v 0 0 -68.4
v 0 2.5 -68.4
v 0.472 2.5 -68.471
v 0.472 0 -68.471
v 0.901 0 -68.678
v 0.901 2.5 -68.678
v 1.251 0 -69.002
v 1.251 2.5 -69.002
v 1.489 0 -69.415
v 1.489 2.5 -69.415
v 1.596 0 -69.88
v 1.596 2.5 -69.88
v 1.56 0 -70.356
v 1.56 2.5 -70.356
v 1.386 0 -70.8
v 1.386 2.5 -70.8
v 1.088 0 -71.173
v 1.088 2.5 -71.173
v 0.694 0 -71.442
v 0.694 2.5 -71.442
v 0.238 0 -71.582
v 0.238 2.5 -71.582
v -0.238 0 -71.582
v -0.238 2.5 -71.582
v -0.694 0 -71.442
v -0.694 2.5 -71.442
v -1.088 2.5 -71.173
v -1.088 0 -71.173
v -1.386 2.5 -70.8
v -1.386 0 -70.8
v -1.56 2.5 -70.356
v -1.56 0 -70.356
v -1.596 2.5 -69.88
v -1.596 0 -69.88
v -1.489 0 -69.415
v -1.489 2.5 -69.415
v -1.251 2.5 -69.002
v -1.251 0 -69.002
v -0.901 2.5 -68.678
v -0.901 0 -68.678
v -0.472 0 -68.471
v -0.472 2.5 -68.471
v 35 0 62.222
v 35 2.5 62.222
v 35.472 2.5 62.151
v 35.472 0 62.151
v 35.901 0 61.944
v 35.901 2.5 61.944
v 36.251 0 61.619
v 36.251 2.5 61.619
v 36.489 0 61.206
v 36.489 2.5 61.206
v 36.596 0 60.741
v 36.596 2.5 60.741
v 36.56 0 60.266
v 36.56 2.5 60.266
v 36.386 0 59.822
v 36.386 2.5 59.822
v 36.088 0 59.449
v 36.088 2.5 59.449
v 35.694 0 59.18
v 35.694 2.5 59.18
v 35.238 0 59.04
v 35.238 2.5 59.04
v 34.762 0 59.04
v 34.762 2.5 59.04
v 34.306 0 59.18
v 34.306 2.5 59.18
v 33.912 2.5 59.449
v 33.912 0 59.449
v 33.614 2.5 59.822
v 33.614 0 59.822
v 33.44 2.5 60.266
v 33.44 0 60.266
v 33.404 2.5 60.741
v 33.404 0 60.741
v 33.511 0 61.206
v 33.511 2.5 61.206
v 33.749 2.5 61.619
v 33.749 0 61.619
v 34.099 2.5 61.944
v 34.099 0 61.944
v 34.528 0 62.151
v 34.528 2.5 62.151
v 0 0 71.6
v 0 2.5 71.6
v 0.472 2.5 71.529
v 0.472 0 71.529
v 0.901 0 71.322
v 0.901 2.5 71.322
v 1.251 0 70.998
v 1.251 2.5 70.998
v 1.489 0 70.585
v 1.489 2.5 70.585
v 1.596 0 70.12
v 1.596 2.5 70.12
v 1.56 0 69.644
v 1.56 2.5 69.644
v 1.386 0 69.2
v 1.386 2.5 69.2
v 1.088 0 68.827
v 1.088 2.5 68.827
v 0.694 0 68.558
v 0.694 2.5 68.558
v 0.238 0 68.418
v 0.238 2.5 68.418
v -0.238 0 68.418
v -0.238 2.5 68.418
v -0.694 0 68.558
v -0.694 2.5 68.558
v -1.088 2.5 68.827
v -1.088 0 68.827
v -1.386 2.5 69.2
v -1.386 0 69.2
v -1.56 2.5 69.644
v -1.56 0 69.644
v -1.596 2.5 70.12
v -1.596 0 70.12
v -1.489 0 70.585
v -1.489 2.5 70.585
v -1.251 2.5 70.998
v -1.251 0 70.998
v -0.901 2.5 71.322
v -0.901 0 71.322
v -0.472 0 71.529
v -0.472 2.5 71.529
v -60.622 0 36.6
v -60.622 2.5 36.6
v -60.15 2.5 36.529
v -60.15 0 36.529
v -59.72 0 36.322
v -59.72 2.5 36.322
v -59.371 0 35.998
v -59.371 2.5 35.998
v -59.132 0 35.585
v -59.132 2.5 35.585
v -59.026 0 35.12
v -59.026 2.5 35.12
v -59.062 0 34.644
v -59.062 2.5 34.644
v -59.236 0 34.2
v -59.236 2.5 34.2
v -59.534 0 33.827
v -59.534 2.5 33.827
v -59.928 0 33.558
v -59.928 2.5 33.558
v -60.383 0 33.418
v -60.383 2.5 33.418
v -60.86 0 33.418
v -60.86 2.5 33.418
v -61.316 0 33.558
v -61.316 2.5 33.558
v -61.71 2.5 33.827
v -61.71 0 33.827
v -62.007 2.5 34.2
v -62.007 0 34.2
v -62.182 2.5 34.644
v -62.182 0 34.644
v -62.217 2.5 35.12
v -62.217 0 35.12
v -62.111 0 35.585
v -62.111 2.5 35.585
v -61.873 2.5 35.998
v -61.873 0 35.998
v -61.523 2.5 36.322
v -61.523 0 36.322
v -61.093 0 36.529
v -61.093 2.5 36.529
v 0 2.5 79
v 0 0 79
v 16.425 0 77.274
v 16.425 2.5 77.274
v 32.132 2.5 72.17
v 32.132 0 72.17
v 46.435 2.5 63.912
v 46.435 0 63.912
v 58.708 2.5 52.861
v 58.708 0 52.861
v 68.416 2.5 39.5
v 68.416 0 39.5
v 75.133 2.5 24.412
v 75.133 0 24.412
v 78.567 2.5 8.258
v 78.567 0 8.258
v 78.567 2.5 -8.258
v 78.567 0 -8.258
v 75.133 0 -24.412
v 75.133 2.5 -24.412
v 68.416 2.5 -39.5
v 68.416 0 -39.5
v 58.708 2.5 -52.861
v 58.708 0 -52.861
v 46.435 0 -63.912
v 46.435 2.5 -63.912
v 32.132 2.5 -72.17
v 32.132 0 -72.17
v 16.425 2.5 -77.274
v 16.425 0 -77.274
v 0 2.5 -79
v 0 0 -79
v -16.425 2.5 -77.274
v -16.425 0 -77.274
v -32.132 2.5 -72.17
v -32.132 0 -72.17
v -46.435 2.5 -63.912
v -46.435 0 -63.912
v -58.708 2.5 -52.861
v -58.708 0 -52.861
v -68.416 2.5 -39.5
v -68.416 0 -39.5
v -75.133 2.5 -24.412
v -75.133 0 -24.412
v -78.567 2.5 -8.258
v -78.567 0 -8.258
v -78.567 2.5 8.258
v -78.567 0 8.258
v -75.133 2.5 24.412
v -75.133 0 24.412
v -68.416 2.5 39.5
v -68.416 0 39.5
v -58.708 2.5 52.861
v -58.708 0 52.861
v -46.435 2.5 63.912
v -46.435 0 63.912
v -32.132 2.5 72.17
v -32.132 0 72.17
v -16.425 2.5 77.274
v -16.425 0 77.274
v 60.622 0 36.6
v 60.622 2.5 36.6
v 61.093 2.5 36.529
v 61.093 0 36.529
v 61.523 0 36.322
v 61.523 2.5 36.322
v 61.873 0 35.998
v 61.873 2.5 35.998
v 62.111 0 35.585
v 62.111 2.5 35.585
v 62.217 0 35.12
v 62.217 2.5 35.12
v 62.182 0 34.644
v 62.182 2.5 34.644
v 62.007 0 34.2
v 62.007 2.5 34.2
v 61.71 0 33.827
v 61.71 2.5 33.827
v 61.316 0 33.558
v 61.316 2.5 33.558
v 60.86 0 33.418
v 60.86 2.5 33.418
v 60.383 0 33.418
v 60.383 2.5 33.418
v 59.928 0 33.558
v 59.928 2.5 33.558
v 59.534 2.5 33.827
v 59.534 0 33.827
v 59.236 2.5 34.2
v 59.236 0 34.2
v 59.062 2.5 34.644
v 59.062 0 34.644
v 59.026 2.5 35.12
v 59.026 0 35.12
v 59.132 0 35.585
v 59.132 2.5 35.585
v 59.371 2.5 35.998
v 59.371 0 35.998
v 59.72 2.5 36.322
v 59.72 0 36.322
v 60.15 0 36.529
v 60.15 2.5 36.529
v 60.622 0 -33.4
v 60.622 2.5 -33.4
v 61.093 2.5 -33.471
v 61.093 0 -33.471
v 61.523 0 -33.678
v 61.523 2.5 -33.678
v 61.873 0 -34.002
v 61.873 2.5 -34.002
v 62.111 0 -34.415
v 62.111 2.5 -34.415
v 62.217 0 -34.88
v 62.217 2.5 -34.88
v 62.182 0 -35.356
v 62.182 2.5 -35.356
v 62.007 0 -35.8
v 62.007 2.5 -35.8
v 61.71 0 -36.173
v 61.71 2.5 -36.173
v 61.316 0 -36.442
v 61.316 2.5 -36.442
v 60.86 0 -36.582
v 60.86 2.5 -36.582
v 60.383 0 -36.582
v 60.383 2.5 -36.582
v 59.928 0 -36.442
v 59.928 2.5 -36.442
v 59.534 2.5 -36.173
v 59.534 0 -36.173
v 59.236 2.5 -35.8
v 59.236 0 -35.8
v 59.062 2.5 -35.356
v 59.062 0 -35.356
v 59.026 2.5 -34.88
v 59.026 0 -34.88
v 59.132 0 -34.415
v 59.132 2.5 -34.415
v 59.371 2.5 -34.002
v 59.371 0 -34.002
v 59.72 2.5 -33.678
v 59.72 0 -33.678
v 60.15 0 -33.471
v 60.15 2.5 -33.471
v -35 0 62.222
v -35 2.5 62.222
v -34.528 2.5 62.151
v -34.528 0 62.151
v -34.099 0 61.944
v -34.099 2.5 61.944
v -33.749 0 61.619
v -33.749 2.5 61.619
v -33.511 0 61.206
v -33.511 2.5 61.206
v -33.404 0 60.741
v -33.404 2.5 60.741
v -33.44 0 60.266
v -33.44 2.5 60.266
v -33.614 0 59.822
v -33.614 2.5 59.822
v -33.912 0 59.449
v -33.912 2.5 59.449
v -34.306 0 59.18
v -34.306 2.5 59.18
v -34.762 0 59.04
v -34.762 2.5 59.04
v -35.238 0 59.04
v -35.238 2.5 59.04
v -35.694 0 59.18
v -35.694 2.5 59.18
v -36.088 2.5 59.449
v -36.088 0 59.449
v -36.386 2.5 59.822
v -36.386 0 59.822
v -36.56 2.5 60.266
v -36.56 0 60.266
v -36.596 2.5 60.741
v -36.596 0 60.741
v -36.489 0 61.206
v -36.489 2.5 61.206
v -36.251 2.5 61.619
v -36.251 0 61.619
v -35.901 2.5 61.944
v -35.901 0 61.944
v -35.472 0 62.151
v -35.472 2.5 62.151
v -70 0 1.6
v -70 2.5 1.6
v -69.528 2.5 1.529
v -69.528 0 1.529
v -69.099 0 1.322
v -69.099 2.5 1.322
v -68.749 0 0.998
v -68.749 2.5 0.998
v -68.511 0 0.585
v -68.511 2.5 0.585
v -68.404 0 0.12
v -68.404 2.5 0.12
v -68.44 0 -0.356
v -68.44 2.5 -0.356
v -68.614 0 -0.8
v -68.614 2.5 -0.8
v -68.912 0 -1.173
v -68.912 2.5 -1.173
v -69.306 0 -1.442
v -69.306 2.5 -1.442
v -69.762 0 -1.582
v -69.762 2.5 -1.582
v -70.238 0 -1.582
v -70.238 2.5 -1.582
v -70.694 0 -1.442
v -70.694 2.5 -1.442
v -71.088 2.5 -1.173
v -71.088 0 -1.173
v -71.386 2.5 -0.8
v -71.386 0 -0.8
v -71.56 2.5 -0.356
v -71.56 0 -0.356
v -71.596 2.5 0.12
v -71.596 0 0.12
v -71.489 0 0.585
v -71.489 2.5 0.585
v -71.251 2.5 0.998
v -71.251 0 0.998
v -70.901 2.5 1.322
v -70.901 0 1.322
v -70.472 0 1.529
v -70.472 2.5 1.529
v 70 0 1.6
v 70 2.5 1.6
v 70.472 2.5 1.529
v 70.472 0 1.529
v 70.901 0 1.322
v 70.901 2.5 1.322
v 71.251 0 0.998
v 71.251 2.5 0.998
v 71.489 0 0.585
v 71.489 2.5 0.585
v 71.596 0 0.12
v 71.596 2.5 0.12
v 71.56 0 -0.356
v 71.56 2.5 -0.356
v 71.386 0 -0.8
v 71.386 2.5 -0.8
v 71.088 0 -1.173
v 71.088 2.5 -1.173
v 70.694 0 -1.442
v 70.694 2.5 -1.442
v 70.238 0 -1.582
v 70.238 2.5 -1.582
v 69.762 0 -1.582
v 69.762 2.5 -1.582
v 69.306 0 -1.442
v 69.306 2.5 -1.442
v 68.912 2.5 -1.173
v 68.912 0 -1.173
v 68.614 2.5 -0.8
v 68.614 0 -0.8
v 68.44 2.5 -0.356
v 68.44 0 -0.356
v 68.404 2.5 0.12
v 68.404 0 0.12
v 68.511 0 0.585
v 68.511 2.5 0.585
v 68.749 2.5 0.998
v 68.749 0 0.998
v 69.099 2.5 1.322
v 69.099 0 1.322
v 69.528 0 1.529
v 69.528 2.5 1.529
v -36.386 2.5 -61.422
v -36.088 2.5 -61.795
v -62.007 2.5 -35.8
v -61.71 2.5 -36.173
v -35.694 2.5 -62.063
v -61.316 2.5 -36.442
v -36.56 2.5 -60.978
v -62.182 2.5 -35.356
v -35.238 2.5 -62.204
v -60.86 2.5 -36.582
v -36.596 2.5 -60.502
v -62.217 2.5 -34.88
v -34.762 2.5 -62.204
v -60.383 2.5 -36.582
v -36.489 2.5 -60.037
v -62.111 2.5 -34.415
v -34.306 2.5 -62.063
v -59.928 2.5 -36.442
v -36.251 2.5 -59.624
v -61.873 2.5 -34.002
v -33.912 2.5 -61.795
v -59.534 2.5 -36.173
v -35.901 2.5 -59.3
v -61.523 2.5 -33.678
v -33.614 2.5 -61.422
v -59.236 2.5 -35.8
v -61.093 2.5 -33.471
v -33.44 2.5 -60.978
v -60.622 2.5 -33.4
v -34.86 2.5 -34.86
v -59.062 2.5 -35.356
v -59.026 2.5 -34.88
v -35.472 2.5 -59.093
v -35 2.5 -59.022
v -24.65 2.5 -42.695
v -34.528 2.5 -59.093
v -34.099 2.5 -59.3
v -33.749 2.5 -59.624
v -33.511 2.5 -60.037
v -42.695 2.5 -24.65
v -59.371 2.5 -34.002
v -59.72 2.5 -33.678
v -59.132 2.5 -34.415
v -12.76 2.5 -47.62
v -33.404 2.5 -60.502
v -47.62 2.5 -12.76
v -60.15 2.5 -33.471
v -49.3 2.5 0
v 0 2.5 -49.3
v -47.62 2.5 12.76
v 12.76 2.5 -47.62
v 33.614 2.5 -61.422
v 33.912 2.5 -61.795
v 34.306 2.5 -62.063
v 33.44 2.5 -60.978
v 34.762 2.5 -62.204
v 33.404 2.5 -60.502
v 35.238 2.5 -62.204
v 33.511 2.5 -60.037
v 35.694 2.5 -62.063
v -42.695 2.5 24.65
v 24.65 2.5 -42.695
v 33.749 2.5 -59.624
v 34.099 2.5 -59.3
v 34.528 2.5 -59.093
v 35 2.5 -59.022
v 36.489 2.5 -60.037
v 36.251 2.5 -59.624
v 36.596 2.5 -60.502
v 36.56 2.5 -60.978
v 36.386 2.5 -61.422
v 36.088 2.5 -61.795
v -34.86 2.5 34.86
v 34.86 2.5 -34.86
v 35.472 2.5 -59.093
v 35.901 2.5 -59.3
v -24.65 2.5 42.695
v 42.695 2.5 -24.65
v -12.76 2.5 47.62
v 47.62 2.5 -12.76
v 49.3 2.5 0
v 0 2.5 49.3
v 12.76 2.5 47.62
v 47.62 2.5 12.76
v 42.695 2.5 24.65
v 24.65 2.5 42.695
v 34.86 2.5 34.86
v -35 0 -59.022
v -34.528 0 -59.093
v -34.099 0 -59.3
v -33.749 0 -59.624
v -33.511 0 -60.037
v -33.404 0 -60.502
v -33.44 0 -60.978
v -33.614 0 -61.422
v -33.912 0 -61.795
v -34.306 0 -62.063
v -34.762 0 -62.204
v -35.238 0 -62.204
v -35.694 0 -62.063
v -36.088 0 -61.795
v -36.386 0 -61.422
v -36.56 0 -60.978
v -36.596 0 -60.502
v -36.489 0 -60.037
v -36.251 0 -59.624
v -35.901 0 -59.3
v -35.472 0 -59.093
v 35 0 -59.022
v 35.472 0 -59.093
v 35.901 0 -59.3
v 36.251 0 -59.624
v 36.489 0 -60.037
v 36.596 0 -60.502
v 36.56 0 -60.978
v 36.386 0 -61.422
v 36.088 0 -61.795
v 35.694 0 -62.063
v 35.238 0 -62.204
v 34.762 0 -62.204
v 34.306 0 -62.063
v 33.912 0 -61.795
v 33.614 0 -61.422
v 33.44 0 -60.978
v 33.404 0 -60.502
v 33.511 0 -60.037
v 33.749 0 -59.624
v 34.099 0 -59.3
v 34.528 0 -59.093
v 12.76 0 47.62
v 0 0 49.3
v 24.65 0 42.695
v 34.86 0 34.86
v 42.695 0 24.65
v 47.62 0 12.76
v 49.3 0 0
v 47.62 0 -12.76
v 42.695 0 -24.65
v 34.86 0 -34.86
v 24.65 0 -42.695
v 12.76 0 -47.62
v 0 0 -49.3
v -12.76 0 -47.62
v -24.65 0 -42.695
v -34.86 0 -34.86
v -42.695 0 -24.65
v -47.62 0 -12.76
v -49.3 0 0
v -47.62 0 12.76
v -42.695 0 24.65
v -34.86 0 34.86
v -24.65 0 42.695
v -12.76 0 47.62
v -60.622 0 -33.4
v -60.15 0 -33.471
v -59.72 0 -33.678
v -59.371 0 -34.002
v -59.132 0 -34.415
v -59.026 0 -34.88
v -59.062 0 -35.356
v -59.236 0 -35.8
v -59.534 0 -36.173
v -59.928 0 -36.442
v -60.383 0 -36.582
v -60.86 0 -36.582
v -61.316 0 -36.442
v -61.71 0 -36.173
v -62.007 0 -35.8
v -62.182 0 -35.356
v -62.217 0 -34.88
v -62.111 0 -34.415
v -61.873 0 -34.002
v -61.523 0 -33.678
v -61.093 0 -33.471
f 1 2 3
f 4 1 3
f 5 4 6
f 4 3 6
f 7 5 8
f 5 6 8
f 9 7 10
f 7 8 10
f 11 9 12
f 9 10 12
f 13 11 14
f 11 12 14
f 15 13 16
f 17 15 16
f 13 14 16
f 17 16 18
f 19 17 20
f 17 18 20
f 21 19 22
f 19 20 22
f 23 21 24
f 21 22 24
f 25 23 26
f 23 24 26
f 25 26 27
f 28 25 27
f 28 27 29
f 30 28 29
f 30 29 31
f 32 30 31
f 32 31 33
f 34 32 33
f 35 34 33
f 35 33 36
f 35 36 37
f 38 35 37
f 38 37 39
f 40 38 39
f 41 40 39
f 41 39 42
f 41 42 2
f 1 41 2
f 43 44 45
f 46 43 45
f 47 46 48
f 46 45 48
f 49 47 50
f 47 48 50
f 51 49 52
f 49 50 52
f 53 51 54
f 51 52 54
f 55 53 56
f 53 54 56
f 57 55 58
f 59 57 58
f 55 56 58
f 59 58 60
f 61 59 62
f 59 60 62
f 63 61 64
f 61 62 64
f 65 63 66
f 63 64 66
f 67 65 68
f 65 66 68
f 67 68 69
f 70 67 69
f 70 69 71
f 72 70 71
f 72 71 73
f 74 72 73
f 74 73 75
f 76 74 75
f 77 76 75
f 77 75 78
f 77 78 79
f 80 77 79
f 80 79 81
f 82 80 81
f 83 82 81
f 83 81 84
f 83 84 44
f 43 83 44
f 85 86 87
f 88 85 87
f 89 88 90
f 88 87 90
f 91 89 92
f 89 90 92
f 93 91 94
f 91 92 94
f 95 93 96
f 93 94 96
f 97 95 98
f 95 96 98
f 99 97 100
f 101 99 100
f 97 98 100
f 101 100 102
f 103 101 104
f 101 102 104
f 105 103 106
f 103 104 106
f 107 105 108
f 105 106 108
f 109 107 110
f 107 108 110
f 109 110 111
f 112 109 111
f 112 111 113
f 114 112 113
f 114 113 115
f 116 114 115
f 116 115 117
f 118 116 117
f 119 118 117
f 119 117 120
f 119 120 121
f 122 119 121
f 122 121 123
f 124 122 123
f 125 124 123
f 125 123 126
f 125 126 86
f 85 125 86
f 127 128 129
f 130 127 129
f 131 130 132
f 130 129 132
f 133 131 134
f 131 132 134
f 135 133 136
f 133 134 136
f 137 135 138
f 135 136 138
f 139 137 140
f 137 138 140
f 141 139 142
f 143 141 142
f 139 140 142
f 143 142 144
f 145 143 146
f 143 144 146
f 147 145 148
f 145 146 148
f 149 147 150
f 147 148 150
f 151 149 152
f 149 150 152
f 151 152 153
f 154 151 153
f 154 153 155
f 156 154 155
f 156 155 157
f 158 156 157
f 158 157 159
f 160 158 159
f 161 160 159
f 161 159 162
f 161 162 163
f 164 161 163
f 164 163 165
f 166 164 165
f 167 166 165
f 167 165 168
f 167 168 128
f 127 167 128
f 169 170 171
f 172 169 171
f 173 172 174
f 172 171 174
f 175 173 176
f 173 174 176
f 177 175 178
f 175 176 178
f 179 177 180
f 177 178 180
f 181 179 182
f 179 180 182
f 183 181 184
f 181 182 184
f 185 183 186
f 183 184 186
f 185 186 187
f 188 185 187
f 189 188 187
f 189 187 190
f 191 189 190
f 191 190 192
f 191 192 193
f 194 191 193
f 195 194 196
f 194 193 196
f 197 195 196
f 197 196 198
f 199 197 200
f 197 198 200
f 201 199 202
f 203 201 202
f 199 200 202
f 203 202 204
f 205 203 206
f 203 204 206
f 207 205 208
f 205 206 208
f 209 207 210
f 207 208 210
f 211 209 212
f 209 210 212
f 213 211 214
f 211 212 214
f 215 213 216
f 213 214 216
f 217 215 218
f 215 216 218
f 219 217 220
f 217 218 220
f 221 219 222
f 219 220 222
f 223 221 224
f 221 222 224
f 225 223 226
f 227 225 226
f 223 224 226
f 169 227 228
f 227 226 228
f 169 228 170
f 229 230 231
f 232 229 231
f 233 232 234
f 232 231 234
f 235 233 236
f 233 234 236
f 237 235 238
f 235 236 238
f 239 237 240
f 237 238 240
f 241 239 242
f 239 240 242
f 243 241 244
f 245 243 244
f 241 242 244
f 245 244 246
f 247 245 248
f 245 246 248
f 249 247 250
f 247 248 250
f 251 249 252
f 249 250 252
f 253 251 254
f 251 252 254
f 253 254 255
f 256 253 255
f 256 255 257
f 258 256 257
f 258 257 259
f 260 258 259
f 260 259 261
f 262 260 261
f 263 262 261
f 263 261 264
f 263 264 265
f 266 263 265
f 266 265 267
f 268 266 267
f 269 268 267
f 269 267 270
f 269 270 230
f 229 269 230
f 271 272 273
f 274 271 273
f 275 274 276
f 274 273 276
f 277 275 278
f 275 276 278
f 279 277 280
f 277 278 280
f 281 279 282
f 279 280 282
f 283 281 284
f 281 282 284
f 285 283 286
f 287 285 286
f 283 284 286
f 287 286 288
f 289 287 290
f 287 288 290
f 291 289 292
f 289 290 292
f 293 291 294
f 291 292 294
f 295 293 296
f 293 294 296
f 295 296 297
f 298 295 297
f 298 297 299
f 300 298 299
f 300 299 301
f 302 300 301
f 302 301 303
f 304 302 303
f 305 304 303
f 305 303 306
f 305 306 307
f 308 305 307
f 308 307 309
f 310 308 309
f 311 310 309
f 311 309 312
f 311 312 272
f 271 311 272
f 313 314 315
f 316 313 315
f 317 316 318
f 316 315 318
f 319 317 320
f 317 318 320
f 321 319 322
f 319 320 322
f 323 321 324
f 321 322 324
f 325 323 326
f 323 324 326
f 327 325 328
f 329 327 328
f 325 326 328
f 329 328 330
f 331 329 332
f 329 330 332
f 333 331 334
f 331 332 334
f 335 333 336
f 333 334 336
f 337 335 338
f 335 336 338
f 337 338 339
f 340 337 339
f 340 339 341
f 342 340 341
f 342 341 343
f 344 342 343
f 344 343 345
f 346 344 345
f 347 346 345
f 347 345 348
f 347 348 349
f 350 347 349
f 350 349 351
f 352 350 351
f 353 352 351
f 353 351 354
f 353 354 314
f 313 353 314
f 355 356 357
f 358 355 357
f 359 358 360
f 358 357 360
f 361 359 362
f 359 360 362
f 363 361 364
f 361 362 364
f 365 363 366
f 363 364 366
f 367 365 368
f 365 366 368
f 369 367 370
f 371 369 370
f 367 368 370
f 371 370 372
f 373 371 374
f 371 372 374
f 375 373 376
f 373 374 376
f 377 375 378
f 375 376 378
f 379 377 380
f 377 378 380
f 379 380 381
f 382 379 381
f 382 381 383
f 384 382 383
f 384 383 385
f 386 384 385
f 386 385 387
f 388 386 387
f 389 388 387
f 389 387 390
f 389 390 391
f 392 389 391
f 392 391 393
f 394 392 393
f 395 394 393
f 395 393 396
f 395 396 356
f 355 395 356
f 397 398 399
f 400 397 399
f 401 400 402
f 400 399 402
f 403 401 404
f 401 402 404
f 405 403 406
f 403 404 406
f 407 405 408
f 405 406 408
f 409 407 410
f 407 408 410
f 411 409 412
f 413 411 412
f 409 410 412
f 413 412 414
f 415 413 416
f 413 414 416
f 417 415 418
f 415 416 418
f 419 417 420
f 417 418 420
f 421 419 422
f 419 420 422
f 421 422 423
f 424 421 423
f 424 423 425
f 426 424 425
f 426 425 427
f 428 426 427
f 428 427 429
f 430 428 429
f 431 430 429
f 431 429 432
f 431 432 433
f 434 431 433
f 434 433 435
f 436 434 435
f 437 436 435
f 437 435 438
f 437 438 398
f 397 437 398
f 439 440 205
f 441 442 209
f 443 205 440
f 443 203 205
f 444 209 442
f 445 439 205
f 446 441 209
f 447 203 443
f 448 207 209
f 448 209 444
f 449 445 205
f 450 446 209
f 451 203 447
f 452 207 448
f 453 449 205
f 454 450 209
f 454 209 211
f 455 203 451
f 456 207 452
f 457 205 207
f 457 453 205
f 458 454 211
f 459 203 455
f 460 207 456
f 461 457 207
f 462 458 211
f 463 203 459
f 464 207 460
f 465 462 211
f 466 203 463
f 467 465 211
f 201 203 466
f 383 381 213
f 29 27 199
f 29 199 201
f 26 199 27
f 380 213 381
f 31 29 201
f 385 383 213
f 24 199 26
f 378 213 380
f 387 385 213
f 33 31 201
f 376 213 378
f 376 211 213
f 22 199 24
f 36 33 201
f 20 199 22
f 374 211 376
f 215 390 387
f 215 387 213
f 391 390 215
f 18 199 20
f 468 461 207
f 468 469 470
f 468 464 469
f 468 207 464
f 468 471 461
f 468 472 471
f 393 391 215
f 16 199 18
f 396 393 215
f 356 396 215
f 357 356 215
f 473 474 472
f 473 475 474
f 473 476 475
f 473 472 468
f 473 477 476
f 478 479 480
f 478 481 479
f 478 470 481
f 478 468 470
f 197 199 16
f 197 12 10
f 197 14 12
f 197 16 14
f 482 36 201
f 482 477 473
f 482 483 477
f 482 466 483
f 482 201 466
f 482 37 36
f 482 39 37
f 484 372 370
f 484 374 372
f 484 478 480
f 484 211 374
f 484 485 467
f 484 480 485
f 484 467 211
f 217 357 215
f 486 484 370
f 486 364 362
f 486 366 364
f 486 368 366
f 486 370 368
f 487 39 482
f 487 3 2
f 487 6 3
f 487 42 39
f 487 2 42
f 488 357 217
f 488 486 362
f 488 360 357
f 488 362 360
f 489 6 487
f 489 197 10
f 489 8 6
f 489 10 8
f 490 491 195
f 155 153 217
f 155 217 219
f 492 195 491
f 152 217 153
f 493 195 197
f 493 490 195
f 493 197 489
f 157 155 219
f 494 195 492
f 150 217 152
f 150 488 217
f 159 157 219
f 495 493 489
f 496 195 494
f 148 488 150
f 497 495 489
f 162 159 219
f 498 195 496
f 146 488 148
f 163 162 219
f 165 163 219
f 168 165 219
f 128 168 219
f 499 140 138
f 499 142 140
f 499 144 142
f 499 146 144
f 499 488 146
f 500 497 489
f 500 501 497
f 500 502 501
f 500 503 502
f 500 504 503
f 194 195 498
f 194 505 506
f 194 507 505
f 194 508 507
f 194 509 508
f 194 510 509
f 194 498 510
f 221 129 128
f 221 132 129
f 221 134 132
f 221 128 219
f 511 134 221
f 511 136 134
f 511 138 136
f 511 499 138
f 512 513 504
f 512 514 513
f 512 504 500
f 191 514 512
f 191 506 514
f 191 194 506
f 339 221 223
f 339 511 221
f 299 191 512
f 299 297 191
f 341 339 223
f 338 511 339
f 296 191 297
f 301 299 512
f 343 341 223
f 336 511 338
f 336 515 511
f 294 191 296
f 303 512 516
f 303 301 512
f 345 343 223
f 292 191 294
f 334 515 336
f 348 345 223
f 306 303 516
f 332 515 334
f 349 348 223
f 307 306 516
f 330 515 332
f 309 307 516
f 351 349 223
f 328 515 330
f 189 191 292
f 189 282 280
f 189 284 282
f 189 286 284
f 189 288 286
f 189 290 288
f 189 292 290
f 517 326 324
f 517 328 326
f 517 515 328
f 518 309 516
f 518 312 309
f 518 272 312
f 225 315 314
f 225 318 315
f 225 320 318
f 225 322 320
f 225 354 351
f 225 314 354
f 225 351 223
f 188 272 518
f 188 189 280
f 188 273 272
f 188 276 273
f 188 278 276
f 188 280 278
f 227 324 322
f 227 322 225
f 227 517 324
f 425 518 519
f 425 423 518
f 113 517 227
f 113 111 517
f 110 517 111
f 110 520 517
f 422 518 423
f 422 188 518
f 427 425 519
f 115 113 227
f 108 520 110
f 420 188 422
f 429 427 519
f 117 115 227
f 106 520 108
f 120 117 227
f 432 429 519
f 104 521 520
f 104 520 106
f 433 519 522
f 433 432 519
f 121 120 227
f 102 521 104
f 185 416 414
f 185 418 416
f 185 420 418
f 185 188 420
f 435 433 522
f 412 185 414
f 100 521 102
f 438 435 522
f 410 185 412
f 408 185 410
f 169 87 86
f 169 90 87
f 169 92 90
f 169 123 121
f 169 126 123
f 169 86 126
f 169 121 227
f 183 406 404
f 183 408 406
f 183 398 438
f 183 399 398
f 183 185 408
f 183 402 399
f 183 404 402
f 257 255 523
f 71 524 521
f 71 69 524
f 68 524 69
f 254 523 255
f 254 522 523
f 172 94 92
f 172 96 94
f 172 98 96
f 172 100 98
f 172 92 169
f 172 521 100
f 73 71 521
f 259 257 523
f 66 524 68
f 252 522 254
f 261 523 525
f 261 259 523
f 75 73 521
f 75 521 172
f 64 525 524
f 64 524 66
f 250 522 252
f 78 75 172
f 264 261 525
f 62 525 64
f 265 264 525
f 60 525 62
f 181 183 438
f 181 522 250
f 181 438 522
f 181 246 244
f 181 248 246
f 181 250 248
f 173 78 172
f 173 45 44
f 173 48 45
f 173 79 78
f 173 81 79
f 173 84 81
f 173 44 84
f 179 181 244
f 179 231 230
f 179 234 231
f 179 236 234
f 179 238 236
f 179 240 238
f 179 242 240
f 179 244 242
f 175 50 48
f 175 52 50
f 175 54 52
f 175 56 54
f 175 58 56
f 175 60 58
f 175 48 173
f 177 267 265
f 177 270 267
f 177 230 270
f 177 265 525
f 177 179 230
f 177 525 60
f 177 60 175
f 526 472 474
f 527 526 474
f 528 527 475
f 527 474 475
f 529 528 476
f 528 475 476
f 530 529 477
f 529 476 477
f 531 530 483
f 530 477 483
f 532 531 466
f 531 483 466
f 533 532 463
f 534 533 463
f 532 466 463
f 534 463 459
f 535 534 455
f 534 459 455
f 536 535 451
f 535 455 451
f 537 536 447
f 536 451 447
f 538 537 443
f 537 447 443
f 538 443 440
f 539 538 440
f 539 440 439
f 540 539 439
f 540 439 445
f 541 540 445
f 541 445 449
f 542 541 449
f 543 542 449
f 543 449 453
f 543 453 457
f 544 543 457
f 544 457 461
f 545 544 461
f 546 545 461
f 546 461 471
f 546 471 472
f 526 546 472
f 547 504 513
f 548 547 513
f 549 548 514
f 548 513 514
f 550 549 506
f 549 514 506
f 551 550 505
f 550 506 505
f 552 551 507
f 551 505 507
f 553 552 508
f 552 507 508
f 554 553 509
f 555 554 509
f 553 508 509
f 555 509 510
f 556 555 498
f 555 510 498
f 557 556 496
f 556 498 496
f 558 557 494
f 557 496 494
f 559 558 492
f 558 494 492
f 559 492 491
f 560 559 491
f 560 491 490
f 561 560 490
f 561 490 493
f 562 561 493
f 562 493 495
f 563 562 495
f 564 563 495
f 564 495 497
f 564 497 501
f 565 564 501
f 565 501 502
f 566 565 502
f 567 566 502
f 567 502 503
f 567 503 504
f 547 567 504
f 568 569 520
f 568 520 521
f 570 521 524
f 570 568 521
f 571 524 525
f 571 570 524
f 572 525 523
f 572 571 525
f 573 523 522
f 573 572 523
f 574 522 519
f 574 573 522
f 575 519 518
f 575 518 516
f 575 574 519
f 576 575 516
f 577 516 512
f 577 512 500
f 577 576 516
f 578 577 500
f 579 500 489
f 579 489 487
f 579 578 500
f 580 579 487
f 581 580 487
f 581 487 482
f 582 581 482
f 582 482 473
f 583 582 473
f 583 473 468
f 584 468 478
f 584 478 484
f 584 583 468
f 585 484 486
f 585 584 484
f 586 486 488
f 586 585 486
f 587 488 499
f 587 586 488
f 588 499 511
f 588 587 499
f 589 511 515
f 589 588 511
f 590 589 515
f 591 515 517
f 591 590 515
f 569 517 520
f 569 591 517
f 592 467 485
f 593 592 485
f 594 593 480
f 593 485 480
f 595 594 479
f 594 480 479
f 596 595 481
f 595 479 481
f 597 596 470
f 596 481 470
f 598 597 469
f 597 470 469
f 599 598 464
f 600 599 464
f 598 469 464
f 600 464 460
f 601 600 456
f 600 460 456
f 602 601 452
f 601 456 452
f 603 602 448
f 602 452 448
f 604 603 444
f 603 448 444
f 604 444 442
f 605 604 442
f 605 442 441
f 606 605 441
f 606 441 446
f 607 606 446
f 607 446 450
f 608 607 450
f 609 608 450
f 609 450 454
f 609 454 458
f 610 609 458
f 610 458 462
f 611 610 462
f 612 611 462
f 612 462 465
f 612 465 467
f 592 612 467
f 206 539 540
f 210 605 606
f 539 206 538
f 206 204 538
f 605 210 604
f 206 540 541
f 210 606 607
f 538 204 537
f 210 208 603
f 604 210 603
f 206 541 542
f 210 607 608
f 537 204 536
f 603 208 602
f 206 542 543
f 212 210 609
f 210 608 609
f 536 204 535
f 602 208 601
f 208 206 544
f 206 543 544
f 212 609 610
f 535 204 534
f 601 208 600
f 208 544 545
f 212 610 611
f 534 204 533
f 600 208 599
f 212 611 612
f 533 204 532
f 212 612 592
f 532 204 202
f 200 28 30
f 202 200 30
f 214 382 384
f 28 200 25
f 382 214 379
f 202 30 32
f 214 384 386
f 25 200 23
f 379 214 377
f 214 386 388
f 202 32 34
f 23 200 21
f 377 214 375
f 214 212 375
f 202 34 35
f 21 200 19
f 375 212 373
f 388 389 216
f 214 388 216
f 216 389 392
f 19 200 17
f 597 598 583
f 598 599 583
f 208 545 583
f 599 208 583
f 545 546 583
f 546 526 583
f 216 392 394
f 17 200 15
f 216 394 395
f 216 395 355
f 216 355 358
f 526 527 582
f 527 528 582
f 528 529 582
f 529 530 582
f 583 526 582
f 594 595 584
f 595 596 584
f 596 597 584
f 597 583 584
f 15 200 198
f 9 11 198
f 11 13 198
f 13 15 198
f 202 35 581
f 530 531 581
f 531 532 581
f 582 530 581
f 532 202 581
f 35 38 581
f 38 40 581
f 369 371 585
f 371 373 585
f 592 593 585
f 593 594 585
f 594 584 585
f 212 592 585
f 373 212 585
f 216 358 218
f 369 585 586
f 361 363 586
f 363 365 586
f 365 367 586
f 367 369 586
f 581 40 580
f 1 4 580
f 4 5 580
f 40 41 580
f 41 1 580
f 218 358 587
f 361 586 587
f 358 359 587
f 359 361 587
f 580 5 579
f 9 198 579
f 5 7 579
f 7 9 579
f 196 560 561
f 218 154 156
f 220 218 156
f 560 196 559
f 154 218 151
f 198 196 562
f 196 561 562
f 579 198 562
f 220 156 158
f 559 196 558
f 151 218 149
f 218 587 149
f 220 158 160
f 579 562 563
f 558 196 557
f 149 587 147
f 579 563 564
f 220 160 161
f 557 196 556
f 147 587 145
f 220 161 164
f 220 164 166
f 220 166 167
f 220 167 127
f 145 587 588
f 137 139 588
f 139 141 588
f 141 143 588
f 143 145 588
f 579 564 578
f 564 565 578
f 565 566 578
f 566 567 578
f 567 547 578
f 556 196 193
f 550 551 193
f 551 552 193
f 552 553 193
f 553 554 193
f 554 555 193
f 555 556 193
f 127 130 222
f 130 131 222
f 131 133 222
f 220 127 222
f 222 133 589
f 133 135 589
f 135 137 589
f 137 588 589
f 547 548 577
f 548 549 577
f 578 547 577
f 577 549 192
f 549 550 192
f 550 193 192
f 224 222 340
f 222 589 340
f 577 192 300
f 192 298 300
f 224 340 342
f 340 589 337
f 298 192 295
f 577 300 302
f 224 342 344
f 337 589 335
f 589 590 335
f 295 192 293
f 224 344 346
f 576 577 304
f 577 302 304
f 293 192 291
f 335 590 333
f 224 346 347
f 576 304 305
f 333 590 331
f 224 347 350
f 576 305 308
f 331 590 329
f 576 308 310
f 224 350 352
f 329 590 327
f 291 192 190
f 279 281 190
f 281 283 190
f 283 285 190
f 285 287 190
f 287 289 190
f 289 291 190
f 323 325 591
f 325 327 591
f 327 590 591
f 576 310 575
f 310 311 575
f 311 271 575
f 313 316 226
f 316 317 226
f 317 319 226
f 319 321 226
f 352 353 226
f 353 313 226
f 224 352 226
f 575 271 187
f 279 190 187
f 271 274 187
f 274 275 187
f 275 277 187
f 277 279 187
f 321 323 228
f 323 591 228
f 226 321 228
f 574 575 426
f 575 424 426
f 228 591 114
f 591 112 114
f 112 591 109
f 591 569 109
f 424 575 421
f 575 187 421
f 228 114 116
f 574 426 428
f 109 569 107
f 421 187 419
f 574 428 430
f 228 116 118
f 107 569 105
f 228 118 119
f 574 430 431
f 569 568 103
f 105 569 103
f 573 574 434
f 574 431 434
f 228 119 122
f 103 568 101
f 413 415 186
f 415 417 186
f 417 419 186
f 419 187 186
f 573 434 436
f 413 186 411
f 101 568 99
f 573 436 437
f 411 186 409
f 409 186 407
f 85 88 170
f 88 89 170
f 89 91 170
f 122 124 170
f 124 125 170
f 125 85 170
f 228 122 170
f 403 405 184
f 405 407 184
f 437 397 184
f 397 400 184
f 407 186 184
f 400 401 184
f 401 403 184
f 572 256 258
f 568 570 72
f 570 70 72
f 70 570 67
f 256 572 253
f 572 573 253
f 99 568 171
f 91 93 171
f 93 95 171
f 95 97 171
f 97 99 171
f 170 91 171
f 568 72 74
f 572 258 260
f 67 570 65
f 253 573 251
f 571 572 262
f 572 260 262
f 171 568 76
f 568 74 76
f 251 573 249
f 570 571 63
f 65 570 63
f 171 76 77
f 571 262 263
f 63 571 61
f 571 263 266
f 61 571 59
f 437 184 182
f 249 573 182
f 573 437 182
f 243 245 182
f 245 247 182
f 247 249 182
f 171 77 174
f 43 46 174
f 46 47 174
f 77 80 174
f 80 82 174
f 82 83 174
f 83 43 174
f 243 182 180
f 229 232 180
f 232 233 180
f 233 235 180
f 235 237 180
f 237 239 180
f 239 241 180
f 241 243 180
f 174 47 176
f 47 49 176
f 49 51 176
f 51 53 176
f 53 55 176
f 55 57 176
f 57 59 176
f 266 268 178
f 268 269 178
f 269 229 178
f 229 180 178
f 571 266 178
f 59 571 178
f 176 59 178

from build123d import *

# Parameters (mm, degrees)
SKETCH1_R           = 79
SKETCH1_R_2         = 49.3
BOSS_EXTRUDE1_DEPTH = 2.5
SKETCH2_R           = 1.6
CUT_EXTRUDE1_DEPTH  = 112.750838923


with BuildPart() as part:
    # Sketch1 → Boss-Extrude1 (new body)
    with BuildSketch(Plane(origin=(0, 0, 0), x_dir=(1, 0, 0), z_dir=(0, 1, 0))):
        with Locations(Location((0, 0, 0), (0, 0, 270))):
            Circle(SKETCH1_R)
        with Locations(Location((0, 0, 0), (0, 0, 270))):
            Circle(SKETCH1_R_2, mode=Mode.SUBTRACT)
    extrude(amount=BOSS_EXTRUDE1_DEPTH)

    # Sketch2 → Cut-Extrude1 (cut, through all)
    with BuildSketch(Plane(origin=(0, 2.5, 0), x_dir=(1, 0, 0), z_dir=(0, 1, 0))):
        with Locations(Location((0, 70, 0), (0, 0, 270))):
            Circle(SKETCH2_R)
        with Locations(Location((35, 60.621778265, 0), (0, 0, 270))):
            Circle(SKETCH2_R)
        with Locations(Location((60.621778265, 35, 0), (0, 0, 270))):
            Circle(SKETCH2_R)
        with Locations(Location((70, 0, 0), (0, 0, 270))):
            Circle(SKETCH2_R)
        with Locations(Location((60.621778265, -35, 0), (0, 0, 270))):
            Circle(SKETCH2_R)
        with Locations(Location((35, -60.621778265, 0), (0, 0, 270))):
            Circle(SKETCH2_R)
        with Locations(Location((0, -70, 0), (0, 0, 270))):
            Circle(SKETCH2_R)
        with Locations(Location((-35, -60.621778265, 0), (0, 0, 270))):
            Circle(SKETCH2_R)
        with Locations(Location((-60.621778265, -35, 0), (0, 0, 270))):
            Circle(SKETCH2_R)
        with Locations(Location((-70, 0, 0), (0, 0, 270))):
            Circle(SKETCH2_R)
        with Locations(Location((-60.621778265, 35, 0), (0, 0, 270))):
            Circle(SKETCH2_R)
        with Locations(Location((-35, 60.621778265, 0), (0, 0, 270))):
            Circle(SKETCH2_R)
    extrude(amount=-CUT_EXTRUDE1_DEPTH, mode=Mode.SUBTRACT)


solid = part.part
